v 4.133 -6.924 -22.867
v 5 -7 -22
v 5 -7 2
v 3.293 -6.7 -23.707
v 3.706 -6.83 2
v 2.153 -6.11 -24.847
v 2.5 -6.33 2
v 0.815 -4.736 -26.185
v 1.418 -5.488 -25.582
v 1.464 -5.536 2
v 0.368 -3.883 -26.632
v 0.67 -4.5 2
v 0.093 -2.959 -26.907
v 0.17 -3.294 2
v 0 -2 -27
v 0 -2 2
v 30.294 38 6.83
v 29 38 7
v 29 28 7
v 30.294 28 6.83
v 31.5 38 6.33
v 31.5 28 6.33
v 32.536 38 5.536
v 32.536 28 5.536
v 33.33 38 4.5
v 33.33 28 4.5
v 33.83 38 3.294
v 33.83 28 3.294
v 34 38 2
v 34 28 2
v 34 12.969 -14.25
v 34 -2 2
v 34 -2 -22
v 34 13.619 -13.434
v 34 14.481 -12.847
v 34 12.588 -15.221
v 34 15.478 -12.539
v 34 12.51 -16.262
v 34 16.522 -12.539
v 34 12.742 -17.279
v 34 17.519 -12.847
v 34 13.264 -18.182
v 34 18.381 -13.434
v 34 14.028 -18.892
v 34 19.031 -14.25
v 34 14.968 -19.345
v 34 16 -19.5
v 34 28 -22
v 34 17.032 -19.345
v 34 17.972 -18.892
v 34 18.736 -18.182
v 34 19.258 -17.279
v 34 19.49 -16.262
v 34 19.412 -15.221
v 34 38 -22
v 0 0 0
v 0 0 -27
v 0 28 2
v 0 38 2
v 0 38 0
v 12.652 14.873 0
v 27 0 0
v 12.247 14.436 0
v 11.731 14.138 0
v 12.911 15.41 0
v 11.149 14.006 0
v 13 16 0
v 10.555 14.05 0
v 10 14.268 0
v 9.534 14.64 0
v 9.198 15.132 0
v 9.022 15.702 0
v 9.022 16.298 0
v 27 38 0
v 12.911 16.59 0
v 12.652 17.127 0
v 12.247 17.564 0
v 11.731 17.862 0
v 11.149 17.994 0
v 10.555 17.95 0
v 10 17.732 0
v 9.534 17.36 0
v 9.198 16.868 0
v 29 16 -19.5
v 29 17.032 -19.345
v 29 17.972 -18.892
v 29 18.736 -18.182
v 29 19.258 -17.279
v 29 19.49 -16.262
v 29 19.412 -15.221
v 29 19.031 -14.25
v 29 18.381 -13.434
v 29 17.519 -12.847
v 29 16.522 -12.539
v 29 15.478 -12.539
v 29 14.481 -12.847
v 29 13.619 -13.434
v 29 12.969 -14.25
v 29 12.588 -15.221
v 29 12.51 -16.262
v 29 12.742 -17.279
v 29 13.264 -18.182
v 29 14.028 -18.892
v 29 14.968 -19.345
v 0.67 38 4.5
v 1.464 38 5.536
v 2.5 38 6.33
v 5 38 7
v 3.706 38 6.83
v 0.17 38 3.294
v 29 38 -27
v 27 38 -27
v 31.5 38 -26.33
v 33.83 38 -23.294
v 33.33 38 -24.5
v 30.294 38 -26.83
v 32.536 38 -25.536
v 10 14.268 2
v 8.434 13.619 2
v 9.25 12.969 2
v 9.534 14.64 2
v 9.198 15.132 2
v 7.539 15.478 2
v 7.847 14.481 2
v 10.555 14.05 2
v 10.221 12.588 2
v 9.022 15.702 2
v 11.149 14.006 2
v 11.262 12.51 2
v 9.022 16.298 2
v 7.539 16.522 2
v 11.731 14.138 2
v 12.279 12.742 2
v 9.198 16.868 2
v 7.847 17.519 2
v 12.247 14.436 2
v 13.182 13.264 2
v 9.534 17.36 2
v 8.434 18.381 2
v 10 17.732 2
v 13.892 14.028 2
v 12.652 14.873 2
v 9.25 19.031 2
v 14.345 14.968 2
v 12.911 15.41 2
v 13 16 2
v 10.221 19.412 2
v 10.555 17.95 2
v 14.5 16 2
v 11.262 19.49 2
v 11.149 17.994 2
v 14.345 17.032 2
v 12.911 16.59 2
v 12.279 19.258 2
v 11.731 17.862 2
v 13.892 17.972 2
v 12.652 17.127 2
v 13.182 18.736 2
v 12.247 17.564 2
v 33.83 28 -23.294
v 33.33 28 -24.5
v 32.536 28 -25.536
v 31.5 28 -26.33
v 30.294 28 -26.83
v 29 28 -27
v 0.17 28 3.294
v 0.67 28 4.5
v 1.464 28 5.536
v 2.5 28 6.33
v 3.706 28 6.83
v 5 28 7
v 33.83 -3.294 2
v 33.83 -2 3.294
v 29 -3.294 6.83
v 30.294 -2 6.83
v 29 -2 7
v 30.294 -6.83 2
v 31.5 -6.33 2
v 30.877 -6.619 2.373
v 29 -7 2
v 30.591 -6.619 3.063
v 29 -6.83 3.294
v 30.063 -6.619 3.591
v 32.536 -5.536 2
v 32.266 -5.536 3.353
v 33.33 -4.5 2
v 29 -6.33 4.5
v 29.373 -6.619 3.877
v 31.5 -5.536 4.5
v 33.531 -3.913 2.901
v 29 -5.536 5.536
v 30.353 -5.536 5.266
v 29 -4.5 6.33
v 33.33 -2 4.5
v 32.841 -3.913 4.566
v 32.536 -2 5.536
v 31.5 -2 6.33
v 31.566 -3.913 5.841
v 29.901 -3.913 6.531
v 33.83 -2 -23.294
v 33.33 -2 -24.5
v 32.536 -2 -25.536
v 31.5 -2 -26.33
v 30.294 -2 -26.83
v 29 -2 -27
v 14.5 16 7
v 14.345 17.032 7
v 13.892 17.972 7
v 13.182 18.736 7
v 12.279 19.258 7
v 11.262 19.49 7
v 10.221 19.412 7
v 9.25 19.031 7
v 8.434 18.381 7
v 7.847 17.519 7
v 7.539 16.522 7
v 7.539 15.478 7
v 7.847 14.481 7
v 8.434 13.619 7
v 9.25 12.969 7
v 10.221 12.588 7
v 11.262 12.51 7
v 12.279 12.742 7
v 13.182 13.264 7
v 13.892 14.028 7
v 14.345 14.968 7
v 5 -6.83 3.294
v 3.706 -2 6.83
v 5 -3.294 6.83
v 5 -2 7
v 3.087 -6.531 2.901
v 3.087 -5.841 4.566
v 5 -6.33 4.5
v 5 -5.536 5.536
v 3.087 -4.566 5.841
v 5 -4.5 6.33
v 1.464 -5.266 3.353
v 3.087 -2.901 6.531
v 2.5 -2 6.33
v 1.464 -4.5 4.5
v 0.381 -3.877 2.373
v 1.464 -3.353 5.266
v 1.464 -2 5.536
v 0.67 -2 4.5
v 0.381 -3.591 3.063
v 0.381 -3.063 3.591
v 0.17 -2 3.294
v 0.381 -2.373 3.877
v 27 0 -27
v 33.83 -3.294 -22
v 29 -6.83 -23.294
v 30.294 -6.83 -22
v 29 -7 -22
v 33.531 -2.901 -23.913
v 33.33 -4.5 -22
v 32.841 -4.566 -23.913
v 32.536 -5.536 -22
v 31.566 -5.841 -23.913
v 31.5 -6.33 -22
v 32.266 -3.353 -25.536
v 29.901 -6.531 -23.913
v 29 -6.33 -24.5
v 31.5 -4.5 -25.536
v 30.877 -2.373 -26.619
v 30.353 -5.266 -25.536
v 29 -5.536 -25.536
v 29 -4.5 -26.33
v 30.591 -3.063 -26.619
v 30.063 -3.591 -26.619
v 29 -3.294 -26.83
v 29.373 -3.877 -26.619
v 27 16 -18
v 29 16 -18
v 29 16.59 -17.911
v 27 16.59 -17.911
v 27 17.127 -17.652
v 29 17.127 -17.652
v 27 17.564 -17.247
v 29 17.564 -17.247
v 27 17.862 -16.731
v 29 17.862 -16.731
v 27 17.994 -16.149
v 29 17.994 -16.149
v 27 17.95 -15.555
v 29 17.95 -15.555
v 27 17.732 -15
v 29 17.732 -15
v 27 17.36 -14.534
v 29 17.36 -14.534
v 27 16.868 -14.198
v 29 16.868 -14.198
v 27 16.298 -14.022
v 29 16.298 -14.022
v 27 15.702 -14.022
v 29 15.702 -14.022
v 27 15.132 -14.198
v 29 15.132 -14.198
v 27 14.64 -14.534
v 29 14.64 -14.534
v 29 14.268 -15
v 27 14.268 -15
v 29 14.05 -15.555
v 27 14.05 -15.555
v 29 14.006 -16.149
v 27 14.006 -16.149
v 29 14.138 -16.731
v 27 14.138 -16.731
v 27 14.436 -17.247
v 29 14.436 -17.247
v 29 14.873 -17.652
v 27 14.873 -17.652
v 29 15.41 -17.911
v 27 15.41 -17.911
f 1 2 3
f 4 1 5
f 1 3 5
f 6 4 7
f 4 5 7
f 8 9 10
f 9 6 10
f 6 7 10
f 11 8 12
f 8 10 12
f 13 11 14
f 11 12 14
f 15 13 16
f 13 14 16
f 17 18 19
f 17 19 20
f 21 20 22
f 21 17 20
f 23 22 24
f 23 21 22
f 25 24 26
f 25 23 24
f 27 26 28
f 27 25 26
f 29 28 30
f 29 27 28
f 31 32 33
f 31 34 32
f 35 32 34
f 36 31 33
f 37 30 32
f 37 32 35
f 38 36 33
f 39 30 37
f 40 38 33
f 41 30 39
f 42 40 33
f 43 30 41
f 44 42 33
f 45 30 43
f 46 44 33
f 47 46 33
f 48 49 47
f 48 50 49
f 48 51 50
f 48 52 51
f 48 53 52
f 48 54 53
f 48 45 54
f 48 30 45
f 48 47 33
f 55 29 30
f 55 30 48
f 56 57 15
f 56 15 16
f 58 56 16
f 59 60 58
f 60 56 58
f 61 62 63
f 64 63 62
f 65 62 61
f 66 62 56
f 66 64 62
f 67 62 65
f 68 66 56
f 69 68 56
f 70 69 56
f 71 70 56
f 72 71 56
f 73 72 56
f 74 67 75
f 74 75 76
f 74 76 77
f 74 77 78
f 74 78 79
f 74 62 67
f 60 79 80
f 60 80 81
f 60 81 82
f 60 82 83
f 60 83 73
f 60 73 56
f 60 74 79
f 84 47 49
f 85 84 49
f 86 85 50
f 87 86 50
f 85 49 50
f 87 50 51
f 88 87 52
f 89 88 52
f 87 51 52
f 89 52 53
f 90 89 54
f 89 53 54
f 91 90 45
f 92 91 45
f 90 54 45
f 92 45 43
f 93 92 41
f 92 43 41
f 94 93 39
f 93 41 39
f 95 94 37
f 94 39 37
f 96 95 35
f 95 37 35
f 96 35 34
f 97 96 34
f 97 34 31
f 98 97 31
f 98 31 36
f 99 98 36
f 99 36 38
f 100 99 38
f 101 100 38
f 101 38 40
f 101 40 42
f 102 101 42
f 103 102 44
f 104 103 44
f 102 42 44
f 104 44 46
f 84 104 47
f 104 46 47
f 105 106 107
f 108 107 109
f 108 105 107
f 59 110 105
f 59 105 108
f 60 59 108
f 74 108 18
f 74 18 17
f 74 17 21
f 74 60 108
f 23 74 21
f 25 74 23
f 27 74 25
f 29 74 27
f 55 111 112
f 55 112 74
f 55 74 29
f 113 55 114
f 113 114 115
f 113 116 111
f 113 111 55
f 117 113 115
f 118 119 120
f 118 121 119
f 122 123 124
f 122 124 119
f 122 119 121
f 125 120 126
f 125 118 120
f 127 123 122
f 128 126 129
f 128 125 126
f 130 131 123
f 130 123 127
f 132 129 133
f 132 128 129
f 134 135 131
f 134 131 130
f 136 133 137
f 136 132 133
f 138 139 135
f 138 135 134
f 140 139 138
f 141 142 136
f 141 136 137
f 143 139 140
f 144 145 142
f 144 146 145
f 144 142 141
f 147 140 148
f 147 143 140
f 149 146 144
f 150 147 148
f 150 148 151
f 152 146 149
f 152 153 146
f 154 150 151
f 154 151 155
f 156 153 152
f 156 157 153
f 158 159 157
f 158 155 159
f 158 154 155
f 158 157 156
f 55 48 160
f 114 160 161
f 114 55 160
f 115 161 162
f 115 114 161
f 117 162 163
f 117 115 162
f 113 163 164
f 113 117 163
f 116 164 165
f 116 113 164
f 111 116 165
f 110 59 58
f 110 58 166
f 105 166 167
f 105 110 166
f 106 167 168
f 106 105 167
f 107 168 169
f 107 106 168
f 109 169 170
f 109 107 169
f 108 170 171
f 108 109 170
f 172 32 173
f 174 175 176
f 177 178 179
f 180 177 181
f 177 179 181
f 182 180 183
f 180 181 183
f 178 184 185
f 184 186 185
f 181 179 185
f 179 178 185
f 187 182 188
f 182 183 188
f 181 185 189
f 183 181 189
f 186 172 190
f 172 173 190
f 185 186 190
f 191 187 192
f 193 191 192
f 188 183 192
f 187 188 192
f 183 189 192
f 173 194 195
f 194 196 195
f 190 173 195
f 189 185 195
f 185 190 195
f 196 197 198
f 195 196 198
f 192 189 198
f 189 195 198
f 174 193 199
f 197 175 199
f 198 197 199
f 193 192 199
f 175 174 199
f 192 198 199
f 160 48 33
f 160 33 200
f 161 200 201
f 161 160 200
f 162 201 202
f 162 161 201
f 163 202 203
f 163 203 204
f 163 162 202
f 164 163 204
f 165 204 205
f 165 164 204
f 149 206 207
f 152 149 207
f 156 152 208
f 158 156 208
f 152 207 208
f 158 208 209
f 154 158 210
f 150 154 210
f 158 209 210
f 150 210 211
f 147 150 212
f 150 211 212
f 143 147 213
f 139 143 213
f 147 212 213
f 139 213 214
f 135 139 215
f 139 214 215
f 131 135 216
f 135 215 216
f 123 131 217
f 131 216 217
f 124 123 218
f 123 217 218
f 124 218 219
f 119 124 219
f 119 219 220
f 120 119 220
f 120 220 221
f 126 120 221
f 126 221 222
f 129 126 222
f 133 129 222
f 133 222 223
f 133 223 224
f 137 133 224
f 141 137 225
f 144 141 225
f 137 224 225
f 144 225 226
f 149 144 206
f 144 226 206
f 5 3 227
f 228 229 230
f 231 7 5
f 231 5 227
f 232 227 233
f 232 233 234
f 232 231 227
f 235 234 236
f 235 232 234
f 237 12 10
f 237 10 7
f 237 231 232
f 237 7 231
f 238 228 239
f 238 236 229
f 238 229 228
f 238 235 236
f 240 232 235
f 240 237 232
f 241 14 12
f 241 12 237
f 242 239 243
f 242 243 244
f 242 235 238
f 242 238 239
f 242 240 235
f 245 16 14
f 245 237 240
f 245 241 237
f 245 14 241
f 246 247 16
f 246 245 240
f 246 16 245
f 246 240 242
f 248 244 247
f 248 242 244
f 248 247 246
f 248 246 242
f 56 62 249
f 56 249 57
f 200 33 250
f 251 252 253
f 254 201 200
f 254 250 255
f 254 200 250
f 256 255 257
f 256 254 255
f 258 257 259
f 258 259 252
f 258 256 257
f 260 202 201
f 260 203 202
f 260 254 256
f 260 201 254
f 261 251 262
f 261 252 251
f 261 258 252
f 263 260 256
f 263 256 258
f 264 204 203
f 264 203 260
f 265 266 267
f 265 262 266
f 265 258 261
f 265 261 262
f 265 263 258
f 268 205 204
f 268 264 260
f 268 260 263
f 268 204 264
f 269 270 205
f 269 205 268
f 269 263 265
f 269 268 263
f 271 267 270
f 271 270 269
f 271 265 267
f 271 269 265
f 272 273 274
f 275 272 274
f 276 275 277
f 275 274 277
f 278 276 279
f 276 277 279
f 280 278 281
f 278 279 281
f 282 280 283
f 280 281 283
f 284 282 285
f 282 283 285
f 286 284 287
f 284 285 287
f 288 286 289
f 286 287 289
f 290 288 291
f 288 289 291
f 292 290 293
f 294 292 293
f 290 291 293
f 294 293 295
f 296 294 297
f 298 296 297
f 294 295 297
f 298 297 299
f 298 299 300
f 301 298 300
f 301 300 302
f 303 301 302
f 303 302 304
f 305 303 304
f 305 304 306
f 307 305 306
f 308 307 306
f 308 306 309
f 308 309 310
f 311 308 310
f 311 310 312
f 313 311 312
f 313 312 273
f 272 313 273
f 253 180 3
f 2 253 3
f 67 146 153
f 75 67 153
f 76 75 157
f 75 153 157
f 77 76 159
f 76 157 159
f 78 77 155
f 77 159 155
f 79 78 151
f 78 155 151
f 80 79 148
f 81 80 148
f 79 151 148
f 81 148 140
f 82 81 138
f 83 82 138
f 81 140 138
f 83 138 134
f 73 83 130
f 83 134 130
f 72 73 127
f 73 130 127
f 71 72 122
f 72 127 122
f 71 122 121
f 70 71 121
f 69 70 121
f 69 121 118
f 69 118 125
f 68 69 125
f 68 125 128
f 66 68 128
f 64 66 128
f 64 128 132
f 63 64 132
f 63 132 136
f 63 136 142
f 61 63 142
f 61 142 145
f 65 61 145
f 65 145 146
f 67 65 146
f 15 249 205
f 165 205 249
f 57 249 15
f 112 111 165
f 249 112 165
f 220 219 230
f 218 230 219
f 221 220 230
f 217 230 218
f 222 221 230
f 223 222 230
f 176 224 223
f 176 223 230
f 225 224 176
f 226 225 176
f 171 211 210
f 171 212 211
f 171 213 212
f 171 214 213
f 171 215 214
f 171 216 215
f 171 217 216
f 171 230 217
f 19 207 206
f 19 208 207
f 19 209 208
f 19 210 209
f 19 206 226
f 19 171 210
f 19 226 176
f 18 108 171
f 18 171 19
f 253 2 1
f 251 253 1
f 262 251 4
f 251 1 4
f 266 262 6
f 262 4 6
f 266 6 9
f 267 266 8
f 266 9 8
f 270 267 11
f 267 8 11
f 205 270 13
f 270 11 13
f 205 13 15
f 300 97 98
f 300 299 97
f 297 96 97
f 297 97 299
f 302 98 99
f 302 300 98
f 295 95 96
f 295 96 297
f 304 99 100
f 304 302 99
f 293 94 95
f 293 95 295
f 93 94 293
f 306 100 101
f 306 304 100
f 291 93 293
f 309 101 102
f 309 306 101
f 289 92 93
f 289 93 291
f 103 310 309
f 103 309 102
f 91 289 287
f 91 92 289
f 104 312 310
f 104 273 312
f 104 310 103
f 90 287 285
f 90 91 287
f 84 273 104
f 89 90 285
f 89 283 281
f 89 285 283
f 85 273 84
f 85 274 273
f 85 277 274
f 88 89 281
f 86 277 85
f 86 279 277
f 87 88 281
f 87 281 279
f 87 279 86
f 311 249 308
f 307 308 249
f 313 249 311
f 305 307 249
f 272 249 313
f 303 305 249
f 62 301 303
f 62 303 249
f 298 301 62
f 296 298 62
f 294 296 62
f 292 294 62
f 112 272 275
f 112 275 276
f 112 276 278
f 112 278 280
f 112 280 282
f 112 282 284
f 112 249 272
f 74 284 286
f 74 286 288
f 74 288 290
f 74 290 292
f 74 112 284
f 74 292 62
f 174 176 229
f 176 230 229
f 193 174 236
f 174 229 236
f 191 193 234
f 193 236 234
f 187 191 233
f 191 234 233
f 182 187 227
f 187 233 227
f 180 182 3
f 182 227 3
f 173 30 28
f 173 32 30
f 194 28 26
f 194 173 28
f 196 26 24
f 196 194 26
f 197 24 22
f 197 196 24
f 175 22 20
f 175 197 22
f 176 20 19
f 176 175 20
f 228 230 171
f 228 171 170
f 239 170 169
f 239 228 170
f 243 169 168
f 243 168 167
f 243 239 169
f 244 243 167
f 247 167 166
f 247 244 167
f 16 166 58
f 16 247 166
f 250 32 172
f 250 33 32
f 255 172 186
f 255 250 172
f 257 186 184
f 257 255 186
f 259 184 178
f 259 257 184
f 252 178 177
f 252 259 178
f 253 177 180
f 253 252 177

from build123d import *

# Parameters (mm, degrees)
SALIENTE_EXTRUIR1_DEPTH = 28
CROQUIS2_W              = 34
CROQUIS2_H              = 34
SALIENTE_EXTRUIR2_DEPTH = 7
REDONDEO1_R             = 5
CROQUIS3_R              = 3.5
CORTAR_EXTRUIR1_DEPTH   = 5
CROQUIS4_R              = 2
CORTAR_EXTRUIR2_DEPTH   = 5
CROQUIS5_R              = 3.5
CORTAR_EXTRUIR3_DEPTH   = 5
CROQUIS6_R              = 2
CORTAR_EXTRUIR4_DEPTH   = 5
REDONDEO2_R             = 5
SALIENTE_EXTRUIR3_START = 10
SALIENTE_EXTRUIR3_DEPTH = 10


with BuildPart() as part:
    # Croquis1 → Saliente-Extruir1 (new body)
    with BuildSketch(Plane(origin=(0, 0, 0), x_dir=(1, 0, 0), z_dir=(0, 1, 0))):
        Polygon((0, 0), (27, 0), (27, 27), (34, 27), (34, -7), (0, -7), align=None)
    extrude(amount=SALIENTE_EXTRUIR1_DEPTH)

    # Croquis2 → Saliente-Extruir2 (add)
    with BuildSketch(Plane(origin=(0, 0, 0), x_dir=(-1, 0, 0), z_dir=(0, -1, 0))):
        with Locations((-17, 10)):
            Rectangle(CROQUIS2_W, CROQUIS2_H)
    extrude(amount=SALIENTE_EXTRUIR2_DEPTH)

    # Redondeo1
    redondeo1_edges = [part.edges().sort_by_distance(p)[0] for p in [
        (34, 10.5, -27),
        (34, 10.5, 7),
        (0, 10.5, 7),
        (34, -7, -10),
        (17, -7, 7),
    ]]
    fillet(redondeo1_edges, radius=REDONDEO1_R)

    # Croquis3 → Cortar-Extruir1 (cut)
    with BuildSketch(Plane(origin=(34, 0, 0), x_dir=(0, 0, -1), z_dir=(1, 0, 0))):
        with Locations((16, 16)):
            Circle(CROQUIS3_R)
    extrude(amount=-CORTAR_EXTRUIR1_DEPTH, mode=Mode.SUBTRACT)

    # Croquis4 → Cortar-Extruir2 (cut)
    with BuildSketch(Plane(origin=(29, 0, 0), x_dir=(0, 0, -1), z_dir=(1, 0, 0))):
        with Locations((16, 16)):
            Circle(CROQUIS4_R)
    extrude(amount=-CORTAR_EXTRUIR2_DEPTH, mode=Mode.SUBTRACT)

    # Croquis5 → Cortar-Extruir3 (cut)
    with BuildSketch(Plane.XY.offset(7)):
        with Locations((11, 16)):
            Circle(CROQUIS5_R)
    extrude(amount=-CORTAR_EXTRUIR3_DEPTH, mode=Mode.SUBTRACT)

    # Croquis6 → Cortar-Extruir4 (cut)
    with BuildSketch(Plane.XY.offset(2)):
        with Locations((11, 16)):
            Circle(CROQUIS6_R)
    extrude(amount=-CORTAR_EXTRUIR4_DEPTH, mode=Mode.SUBTRACT)

    # Redondeo2
    # the kernel refuses this fillet: 5 mm, written as the material it takes off along each edge
    with BuildSketch(Plane(origin=(29, -2, -22), x_dir=(0, -1, 0), z_dir=(0, 0, -1))) as redondeo2_piece_1_section:
        Polygon((0, 0), (REDONDEO2_R, 0), (REDONDEO2_R, -REDONDEO2_R), (0, -REDONDEO2_R), align=None)
    redondeo2_piece_1 = extrude(amount=REDONDEO2_R, mode=Mode.PRIVATE)
    redondeo2_piece_1 = redondeo2_piece_1 - Plane(origin=(29, -2, -22), x_dir=(-0.7071067811865475, 0.7071067811865475, 0), z_dir=(0, 0, -1)) * Sphere(REDONDEO2_R, mode=Mode.PRIVATE)
    add(redondeo2_piece_1, mode=Mode.SUBTRACT)
    with BuildSketch(Plane(origin=(5, -2, 2), x_dir=(0, -1, 0), z_dir=(-1, 0, 0))) as redondeo2_piece_2_section:
        Polygon((0, 0), (REDONDEO2_R, 0), (REDONDEO2_R, REDONDEO2_R), (0, REDONDEO2_R), align=None)
    redondeo2_piece_2 = extrude(amount=REDONDEO2_R, mode=Mode.PRIVATE)
    redondeo2_piece_2 = redondeo2_piece_2 - Plane(origin=(5, -2, 2), x_dir=(0, 0.7071067811865475, -0.7071067811865475), z_dir=(-1, 0, 0)) * Sphere(REDONDEO2_R, mode=Mode.PRIVATE)
    add(redondeo2_piece_2, mode=Mode.SUBTRACT)
    with BuildSketch(Plane(origin=(-12.5, -7, -27), x_dir=(0, 1, 0), z_dir=(1, 0, 0)), Plane(origin=(0, -7, 2), x_dir=(0, 1, 0), z_dir=(0, 0, -1))) as redondeo2_piece_3:
        with BuildLine():
            CenterArc((REDONDEO2_R, REDONDEO2_R), REDONDEO2_R, 180, 90)
            Line((0, REDONDEO2_R), (0, 0))
            Line((0, 0), (REDONDEO2_R, 0))
        make_face()
    extrude(amount=41.5, mode=Mode.SUBTRACT)

    # Croquis7 → Saliente-Extruir3 (add)
    with BuildSketch(Plane(origin=(0, 28, 0), x_dir=(1, 0, 0), z_dir=(0, 1, 0)).offset(SALIENTE_EXTRUIR3_START)):
        with BuildLine():
            Line((34, -2), (34, 22))
            ThreePointArc((34, 22), (32.535533906, 25.535533906), (29, 27))
            Line((29, 27), (27, 27))
            Line((27, 27), (27, 0))
            Line((27, 0), (0, 0))
            Line((0, 0), (0, -2))
            ThreePointArc((0, -2), (1.464466094, -5.535533906), (5, -7))
            Line((5, -7), (29, -7))
            ThreePointArc((29, -7), (32.535533906, -5.535533906), (34, -2))
        make_face()
    extrude(amount=-SALIENTE_EXTRUIR3_DEPTH)


solid = part.part
